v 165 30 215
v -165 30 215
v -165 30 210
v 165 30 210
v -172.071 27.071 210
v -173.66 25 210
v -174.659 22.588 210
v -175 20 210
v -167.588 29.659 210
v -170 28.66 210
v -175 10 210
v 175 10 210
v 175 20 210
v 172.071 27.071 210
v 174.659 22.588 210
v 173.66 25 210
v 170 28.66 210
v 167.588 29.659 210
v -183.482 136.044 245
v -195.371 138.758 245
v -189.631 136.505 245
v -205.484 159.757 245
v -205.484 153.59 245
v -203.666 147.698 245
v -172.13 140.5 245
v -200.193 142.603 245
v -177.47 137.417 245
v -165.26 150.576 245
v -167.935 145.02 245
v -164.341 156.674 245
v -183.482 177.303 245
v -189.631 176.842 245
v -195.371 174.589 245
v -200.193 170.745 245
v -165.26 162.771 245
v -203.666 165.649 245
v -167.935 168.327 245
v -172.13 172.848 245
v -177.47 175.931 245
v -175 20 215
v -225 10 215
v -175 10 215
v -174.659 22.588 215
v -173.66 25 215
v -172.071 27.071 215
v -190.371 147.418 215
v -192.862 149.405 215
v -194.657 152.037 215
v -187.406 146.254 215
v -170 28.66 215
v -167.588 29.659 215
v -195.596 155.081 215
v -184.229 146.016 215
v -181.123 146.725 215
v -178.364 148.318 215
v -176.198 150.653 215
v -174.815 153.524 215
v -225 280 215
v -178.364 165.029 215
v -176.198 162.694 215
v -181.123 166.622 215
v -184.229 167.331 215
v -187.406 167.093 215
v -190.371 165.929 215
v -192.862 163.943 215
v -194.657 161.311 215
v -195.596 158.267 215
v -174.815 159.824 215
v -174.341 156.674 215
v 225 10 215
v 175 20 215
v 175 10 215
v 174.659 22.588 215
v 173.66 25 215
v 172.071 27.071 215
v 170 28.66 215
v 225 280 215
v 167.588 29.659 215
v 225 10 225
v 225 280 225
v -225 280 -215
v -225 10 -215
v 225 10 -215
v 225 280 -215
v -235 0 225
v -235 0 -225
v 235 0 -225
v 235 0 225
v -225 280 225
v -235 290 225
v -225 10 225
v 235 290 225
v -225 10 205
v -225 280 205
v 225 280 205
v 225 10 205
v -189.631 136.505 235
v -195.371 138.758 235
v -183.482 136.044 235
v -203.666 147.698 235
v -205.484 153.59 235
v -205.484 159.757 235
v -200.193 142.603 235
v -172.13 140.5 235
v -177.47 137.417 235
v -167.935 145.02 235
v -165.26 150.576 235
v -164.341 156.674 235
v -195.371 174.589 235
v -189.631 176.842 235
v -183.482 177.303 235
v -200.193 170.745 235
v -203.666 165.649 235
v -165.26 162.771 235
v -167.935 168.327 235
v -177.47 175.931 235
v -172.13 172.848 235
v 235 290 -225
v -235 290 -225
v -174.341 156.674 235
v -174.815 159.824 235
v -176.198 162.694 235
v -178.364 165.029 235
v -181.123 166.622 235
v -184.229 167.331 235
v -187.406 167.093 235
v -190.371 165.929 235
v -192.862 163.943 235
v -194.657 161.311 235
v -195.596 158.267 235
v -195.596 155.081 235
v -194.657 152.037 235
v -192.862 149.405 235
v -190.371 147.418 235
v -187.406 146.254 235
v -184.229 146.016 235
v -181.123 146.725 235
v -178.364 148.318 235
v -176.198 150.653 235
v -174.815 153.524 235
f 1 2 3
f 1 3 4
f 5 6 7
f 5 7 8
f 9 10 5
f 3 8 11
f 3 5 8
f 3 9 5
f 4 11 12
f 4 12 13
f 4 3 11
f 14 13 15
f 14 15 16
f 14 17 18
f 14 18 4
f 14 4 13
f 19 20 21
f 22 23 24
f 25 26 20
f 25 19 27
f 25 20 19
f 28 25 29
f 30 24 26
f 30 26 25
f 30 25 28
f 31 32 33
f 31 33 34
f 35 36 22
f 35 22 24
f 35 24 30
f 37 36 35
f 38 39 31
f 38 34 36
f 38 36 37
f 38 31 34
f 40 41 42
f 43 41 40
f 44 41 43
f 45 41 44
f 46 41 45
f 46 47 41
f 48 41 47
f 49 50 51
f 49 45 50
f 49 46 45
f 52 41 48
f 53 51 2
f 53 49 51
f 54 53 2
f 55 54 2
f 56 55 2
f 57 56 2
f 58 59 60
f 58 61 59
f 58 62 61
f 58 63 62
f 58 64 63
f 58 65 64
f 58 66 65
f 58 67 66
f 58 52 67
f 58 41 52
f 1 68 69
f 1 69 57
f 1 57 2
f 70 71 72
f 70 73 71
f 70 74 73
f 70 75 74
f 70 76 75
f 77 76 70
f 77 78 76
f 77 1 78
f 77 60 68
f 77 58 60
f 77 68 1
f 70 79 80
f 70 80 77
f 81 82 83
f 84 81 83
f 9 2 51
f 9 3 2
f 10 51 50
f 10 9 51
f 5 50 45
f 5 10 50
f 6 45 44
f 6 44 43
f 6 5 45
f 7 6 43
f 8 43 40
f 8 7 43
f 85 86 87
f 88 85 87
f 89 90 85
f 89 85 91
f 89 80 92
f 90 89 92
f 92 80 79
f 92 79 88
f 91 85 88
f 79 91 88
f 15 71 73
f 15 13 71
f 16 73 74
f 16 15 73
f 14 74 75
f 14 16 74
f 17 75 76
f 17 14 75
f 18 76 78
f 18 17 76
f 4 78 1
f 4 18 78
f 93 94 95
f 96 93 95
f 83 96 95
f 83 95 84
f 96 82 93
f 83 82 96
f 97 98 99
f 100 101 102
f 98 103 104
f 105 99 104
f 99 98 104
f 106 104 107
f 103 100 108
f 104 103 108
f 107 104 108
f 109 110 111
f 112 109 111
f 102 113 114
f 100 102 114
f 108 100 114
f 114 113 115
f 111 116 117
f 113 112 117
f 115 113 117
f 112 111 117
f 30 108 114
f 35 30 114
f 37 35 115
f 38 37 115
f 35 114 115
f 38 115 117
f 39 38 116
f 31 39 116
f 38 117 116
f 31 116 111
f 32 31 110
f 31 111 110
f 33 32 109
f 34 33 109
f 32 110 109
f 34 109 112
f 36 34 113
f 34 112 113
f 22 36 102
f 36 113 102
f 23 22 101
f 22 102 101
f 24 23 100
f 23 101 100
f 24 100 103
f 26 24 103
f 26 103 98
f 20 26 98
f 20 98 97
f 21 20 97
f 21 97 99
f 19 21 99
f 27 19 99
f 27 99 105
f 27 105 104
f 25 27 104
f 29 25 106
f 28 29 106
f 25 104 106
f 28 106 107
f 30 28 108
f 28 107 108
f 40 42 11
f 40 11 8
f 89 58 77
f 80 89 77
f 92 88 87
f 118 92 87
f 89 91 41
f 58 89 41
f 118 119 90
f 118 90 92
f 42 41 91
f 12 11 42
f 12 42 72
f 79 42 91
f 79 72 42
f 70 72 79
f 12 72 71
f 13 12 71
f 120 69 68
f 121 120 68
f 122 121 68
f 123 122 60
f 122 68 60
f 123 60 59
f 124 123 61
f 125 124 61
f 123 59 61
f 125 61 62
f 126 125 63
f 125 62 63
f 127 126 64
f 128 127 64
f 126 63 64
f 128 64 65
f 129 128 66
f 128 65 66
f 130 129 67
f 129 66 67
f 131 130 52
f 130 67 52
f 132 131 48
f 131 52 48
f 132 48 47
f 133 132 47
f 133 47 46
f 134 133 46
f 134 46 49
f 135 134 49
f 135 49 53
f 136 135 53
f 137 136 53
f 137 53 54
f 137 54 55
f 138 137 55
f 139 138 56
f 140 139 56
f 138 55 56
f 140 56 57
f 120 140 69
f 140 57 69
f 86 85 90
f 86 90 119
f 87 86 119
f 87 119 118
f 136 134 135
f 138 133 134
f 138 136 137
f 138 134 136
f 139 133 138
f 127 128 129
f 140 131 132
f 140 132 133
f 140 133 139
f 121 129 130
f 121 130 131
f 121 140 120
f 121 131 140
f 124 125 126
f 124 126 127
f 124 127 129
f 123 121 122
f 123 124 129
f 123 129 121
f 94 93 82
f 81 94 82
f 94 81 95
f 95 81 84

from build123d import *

# Parameters (mm, degrees)
SKETCH1_W           = 470
SKETCH1_H           = 450
BOSS_EXTRUDE1_DEPTH = 290
SHELL1_T            = -10
BOSS_EXTRUDE2_START = -20
SKETCH2_W           = 450
SKETCH2_H           = 270
BOSS_EXTRUDE2_DEPTH = 10
SKETCH3_W           = 350
SKETCH3_H           = 20
CUT_EXTRUDE1_DEPTH  = 5
FILLET1_R           = 10
SKETCH4_R           = 10.687155437
BOSS_EXTRUDE3_DEPTH = 20
SKETCH5_R           = 20.687155437
BOSS_EXTRUDE4_DEPTH = 10


with BuildPart() as part:
    # Sketch1 → Boss-Extrude1 (new body)
    with BuildSketch(Plane(origin=(0, 0, 0), x_dir=(1, 0, 0), z_dir=(0, 1, 0))):
        Rectangle(SKETCH1_W, SKETCH1_H)
    extrude(amount=BOSS_EXTRUDE1_DEPTH)

    # Shell1
    shell1_openings = [part.faces().sort_by_distance(p)[0] for p in [
        (0, 145, 225),
    ]]
    offset(amount=SHELL1_T, openings=shell1_openings, kind=Kind.INTERSECTION)

    # Sketch2 → Boss-Extrude2 (add)
    with BuildSketch(Plane.XY.offset(225).offset(BOSS_EXTRUDE2_START)):
        with Locations((0, 145)):
            Rectangle(SKETCH2_W, SKETCH2_H)
    extrude(amount=BOSS_EXTRUDE2_DEPTH)

    # Sketch3 → Cut-Extrude1 (cut)
    with BuildSketch(Plane.XY.offset(215)):
        with Locations((0, 20)):
            Rectangle(SKETCH3_W, SKETCH3_H)
    extrude(amount=-CUT_EXTRUDE1_DEPTH, mode=Mode.SUBTRACT)

    # Fillet1
    fillet1_edges = [part.edges().sort_by_distance(p)[0] for p in [
        (175, 30, 212.5),
        (-175, 30, 212.5),
    ]]
    fillet(fillet1_edges, radius=FILLET1_R)

    # Sketch4 → Boss-Extrude3 (add)
    with BuildSketch(Plane.XY.offset(215)):
        with Locations((-185.027804202, 156.673678499)):
            Circle(SKETCH4_R)
    extrude(amount=BOSS_EXTRUDE3_DEPTH)


with BuildPart() as body_2:
    # Sketch5 → Boss-Extrude4 (new body)
    with BuildSketch(Plane.XY.offset(235)):
        with Locations((-185.027804202, 156.673678499)):
            Circle(SKETCH5_R)
    extrude(amount=BOSS_EXTRUDE4_DEPTH)


solid = Compound([part.part, body_2.part])
